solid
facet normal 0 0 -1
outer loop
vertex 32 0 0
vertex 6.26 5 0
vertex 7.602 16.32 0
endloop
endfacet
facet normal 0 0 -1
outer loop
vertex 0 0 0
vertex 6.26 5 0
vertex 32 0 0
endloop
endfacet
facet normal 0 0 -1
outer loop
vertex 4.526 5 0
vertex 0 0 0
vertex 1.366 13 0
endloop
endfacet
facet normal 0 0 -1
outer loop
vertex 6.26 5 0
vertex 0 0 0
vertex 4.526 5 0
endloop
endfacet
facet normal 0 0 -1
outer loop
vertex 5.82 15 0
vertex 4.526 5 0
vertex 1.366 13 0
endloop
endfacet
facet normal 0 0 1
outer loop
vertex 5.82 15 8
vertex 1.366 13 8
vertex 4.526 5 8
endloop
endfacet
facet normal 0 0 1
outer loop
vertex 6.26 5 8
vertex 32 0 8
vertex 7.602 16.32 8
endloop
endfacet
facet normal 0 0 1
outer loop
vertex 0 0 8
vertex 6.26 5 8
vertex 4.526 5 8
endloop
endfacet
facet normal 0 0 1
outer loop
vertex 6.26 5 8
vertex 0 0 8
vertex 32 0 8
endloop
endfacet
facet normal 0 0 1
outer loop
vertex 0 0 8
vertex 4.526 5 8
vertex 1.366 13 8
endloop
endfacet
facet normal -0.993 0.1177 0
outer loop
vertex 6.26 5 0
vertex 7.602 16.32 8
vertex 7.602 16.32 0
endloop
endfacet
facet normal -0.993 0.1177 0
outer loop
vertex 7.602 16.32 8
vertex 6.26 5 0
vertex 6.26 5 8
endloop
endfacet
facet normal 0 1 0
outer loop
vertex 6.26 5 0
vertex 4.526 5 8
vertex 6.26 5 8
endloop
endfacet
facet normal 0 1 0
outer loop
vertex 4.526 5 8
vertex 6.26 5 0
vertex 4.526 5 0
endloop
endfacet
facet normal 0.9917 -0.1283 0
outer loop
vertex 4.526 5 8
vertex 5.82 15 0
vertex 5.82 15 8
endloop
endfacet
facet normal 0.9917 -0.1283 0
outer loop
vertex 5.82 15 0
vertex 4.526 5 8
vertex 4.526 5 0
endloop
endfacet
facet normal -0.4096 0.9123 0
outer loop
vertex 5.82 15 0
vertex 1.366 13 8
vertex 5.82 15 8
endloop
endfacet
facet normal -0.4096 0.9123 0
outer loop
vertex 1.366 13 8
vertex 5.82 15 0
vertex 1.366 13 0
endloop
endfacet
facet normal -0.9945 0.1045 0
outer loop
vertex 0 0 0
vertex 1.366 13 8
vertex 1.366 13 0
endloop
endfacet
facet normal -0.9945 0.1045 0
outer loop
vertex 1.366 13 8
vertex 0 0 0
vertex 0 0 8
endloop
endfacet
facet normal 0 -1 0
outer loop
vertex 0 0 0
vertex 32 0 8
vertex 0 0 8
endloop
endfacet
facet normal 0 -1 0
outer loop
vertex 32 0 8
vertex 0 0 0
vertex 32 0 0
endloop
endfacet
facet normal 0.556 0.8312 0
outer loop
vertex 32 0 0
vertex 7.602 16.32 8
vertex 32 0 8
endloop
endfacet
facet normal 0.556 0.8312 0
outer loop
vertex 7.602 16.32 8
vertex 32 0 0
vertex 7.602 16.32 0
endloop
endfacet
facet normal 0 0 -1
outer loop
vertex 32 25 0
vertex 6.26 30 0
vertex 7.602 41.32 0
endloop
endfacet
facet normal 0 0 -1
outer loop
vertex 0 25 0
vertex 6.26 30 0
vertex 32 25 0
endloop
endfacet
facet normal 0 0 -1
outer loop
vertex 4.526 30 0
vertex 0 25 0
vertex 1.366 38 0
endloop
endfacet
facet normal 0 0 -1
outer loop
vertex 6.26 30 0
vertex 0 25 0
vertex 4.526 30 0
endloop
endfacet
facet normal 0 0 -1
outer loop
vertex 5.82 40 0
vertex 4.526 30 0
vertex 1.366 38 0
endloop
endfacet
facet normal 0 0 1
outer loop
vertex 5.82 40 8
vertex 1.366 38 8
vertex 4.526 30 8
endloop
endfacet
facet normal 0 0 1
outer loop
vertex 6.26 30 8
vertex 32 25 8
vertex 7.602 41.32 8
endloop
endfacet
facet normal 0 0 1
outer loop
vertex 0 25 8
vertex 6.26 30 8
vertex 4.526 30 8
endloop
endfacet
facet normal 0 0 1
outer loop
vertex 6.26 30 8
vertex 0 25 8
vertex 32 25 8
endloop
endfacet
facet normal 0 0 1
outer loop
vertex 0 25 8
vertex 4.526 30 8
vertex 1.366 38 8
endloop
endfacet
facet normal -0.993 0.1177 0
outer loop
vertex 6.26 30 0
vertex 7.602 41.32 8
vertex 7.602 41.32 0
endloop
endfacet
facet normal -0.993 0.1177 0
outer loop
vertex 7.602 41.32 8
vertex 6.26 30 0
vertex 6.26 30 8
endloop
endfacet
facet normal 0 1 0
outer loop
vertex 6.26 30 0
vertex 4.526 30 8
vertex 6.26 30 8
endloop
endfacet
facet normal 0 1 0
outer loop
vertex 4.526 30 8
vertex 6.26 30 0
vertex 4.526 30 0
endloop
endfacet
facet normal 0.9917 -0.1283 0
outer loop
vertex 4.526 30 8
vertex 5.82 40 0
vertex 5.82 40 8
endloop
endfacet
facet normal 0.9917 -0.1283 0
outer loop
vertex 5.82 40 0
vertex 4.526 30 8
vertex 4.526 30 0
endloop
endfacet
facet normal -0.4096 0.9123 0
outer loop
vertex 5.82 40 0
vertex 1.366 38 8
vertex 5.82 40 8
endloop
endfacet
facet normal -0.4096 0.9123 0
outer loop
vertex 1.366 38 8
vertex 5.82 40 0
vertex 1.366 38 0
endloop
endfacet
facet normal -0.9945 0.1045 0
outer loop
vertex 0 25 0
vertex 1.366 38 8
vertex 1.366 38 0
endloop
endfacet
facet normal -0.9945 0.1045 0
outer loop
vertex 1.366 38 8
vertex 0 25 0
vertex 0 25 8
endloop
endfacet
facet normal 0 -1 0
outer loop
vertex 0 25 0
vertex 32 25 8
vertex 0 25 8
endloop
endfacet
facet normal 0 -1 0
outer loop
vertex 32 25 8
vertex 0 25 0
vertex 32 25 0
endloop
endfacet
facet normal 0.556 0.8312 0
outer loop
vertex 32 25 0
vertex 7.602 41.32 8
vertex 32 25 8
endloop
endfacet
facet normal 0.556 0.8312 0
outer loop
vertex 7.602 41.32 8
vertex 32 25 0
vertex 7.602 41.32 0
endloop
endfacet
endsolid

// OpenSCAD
// Define the triangle points
A = [0, 0];
B = [3.2, 0];
// C = [0.2102, 2];
// D = [0.6102, 1.732];
C = [0.1366, 1.3];
D = [0.582, 1.5];
E = [0.7602, 1.632];
F = [0.4526, 0.5];
G = [0.626, 0.5];

points = [A, B, E, G, F, D, C];

// Function to create the scaled and extruded object
module createObject() {
    scale([10, 10, 10])
    linear_extrude(height = 0.8)  // Ensure height is also scaled
        polygon(points);
}

// Create the first object
createObject();

// Create the second object with an offset
translate([0, 25, 0]) // Adjust the X offset as needed
    createObject();
